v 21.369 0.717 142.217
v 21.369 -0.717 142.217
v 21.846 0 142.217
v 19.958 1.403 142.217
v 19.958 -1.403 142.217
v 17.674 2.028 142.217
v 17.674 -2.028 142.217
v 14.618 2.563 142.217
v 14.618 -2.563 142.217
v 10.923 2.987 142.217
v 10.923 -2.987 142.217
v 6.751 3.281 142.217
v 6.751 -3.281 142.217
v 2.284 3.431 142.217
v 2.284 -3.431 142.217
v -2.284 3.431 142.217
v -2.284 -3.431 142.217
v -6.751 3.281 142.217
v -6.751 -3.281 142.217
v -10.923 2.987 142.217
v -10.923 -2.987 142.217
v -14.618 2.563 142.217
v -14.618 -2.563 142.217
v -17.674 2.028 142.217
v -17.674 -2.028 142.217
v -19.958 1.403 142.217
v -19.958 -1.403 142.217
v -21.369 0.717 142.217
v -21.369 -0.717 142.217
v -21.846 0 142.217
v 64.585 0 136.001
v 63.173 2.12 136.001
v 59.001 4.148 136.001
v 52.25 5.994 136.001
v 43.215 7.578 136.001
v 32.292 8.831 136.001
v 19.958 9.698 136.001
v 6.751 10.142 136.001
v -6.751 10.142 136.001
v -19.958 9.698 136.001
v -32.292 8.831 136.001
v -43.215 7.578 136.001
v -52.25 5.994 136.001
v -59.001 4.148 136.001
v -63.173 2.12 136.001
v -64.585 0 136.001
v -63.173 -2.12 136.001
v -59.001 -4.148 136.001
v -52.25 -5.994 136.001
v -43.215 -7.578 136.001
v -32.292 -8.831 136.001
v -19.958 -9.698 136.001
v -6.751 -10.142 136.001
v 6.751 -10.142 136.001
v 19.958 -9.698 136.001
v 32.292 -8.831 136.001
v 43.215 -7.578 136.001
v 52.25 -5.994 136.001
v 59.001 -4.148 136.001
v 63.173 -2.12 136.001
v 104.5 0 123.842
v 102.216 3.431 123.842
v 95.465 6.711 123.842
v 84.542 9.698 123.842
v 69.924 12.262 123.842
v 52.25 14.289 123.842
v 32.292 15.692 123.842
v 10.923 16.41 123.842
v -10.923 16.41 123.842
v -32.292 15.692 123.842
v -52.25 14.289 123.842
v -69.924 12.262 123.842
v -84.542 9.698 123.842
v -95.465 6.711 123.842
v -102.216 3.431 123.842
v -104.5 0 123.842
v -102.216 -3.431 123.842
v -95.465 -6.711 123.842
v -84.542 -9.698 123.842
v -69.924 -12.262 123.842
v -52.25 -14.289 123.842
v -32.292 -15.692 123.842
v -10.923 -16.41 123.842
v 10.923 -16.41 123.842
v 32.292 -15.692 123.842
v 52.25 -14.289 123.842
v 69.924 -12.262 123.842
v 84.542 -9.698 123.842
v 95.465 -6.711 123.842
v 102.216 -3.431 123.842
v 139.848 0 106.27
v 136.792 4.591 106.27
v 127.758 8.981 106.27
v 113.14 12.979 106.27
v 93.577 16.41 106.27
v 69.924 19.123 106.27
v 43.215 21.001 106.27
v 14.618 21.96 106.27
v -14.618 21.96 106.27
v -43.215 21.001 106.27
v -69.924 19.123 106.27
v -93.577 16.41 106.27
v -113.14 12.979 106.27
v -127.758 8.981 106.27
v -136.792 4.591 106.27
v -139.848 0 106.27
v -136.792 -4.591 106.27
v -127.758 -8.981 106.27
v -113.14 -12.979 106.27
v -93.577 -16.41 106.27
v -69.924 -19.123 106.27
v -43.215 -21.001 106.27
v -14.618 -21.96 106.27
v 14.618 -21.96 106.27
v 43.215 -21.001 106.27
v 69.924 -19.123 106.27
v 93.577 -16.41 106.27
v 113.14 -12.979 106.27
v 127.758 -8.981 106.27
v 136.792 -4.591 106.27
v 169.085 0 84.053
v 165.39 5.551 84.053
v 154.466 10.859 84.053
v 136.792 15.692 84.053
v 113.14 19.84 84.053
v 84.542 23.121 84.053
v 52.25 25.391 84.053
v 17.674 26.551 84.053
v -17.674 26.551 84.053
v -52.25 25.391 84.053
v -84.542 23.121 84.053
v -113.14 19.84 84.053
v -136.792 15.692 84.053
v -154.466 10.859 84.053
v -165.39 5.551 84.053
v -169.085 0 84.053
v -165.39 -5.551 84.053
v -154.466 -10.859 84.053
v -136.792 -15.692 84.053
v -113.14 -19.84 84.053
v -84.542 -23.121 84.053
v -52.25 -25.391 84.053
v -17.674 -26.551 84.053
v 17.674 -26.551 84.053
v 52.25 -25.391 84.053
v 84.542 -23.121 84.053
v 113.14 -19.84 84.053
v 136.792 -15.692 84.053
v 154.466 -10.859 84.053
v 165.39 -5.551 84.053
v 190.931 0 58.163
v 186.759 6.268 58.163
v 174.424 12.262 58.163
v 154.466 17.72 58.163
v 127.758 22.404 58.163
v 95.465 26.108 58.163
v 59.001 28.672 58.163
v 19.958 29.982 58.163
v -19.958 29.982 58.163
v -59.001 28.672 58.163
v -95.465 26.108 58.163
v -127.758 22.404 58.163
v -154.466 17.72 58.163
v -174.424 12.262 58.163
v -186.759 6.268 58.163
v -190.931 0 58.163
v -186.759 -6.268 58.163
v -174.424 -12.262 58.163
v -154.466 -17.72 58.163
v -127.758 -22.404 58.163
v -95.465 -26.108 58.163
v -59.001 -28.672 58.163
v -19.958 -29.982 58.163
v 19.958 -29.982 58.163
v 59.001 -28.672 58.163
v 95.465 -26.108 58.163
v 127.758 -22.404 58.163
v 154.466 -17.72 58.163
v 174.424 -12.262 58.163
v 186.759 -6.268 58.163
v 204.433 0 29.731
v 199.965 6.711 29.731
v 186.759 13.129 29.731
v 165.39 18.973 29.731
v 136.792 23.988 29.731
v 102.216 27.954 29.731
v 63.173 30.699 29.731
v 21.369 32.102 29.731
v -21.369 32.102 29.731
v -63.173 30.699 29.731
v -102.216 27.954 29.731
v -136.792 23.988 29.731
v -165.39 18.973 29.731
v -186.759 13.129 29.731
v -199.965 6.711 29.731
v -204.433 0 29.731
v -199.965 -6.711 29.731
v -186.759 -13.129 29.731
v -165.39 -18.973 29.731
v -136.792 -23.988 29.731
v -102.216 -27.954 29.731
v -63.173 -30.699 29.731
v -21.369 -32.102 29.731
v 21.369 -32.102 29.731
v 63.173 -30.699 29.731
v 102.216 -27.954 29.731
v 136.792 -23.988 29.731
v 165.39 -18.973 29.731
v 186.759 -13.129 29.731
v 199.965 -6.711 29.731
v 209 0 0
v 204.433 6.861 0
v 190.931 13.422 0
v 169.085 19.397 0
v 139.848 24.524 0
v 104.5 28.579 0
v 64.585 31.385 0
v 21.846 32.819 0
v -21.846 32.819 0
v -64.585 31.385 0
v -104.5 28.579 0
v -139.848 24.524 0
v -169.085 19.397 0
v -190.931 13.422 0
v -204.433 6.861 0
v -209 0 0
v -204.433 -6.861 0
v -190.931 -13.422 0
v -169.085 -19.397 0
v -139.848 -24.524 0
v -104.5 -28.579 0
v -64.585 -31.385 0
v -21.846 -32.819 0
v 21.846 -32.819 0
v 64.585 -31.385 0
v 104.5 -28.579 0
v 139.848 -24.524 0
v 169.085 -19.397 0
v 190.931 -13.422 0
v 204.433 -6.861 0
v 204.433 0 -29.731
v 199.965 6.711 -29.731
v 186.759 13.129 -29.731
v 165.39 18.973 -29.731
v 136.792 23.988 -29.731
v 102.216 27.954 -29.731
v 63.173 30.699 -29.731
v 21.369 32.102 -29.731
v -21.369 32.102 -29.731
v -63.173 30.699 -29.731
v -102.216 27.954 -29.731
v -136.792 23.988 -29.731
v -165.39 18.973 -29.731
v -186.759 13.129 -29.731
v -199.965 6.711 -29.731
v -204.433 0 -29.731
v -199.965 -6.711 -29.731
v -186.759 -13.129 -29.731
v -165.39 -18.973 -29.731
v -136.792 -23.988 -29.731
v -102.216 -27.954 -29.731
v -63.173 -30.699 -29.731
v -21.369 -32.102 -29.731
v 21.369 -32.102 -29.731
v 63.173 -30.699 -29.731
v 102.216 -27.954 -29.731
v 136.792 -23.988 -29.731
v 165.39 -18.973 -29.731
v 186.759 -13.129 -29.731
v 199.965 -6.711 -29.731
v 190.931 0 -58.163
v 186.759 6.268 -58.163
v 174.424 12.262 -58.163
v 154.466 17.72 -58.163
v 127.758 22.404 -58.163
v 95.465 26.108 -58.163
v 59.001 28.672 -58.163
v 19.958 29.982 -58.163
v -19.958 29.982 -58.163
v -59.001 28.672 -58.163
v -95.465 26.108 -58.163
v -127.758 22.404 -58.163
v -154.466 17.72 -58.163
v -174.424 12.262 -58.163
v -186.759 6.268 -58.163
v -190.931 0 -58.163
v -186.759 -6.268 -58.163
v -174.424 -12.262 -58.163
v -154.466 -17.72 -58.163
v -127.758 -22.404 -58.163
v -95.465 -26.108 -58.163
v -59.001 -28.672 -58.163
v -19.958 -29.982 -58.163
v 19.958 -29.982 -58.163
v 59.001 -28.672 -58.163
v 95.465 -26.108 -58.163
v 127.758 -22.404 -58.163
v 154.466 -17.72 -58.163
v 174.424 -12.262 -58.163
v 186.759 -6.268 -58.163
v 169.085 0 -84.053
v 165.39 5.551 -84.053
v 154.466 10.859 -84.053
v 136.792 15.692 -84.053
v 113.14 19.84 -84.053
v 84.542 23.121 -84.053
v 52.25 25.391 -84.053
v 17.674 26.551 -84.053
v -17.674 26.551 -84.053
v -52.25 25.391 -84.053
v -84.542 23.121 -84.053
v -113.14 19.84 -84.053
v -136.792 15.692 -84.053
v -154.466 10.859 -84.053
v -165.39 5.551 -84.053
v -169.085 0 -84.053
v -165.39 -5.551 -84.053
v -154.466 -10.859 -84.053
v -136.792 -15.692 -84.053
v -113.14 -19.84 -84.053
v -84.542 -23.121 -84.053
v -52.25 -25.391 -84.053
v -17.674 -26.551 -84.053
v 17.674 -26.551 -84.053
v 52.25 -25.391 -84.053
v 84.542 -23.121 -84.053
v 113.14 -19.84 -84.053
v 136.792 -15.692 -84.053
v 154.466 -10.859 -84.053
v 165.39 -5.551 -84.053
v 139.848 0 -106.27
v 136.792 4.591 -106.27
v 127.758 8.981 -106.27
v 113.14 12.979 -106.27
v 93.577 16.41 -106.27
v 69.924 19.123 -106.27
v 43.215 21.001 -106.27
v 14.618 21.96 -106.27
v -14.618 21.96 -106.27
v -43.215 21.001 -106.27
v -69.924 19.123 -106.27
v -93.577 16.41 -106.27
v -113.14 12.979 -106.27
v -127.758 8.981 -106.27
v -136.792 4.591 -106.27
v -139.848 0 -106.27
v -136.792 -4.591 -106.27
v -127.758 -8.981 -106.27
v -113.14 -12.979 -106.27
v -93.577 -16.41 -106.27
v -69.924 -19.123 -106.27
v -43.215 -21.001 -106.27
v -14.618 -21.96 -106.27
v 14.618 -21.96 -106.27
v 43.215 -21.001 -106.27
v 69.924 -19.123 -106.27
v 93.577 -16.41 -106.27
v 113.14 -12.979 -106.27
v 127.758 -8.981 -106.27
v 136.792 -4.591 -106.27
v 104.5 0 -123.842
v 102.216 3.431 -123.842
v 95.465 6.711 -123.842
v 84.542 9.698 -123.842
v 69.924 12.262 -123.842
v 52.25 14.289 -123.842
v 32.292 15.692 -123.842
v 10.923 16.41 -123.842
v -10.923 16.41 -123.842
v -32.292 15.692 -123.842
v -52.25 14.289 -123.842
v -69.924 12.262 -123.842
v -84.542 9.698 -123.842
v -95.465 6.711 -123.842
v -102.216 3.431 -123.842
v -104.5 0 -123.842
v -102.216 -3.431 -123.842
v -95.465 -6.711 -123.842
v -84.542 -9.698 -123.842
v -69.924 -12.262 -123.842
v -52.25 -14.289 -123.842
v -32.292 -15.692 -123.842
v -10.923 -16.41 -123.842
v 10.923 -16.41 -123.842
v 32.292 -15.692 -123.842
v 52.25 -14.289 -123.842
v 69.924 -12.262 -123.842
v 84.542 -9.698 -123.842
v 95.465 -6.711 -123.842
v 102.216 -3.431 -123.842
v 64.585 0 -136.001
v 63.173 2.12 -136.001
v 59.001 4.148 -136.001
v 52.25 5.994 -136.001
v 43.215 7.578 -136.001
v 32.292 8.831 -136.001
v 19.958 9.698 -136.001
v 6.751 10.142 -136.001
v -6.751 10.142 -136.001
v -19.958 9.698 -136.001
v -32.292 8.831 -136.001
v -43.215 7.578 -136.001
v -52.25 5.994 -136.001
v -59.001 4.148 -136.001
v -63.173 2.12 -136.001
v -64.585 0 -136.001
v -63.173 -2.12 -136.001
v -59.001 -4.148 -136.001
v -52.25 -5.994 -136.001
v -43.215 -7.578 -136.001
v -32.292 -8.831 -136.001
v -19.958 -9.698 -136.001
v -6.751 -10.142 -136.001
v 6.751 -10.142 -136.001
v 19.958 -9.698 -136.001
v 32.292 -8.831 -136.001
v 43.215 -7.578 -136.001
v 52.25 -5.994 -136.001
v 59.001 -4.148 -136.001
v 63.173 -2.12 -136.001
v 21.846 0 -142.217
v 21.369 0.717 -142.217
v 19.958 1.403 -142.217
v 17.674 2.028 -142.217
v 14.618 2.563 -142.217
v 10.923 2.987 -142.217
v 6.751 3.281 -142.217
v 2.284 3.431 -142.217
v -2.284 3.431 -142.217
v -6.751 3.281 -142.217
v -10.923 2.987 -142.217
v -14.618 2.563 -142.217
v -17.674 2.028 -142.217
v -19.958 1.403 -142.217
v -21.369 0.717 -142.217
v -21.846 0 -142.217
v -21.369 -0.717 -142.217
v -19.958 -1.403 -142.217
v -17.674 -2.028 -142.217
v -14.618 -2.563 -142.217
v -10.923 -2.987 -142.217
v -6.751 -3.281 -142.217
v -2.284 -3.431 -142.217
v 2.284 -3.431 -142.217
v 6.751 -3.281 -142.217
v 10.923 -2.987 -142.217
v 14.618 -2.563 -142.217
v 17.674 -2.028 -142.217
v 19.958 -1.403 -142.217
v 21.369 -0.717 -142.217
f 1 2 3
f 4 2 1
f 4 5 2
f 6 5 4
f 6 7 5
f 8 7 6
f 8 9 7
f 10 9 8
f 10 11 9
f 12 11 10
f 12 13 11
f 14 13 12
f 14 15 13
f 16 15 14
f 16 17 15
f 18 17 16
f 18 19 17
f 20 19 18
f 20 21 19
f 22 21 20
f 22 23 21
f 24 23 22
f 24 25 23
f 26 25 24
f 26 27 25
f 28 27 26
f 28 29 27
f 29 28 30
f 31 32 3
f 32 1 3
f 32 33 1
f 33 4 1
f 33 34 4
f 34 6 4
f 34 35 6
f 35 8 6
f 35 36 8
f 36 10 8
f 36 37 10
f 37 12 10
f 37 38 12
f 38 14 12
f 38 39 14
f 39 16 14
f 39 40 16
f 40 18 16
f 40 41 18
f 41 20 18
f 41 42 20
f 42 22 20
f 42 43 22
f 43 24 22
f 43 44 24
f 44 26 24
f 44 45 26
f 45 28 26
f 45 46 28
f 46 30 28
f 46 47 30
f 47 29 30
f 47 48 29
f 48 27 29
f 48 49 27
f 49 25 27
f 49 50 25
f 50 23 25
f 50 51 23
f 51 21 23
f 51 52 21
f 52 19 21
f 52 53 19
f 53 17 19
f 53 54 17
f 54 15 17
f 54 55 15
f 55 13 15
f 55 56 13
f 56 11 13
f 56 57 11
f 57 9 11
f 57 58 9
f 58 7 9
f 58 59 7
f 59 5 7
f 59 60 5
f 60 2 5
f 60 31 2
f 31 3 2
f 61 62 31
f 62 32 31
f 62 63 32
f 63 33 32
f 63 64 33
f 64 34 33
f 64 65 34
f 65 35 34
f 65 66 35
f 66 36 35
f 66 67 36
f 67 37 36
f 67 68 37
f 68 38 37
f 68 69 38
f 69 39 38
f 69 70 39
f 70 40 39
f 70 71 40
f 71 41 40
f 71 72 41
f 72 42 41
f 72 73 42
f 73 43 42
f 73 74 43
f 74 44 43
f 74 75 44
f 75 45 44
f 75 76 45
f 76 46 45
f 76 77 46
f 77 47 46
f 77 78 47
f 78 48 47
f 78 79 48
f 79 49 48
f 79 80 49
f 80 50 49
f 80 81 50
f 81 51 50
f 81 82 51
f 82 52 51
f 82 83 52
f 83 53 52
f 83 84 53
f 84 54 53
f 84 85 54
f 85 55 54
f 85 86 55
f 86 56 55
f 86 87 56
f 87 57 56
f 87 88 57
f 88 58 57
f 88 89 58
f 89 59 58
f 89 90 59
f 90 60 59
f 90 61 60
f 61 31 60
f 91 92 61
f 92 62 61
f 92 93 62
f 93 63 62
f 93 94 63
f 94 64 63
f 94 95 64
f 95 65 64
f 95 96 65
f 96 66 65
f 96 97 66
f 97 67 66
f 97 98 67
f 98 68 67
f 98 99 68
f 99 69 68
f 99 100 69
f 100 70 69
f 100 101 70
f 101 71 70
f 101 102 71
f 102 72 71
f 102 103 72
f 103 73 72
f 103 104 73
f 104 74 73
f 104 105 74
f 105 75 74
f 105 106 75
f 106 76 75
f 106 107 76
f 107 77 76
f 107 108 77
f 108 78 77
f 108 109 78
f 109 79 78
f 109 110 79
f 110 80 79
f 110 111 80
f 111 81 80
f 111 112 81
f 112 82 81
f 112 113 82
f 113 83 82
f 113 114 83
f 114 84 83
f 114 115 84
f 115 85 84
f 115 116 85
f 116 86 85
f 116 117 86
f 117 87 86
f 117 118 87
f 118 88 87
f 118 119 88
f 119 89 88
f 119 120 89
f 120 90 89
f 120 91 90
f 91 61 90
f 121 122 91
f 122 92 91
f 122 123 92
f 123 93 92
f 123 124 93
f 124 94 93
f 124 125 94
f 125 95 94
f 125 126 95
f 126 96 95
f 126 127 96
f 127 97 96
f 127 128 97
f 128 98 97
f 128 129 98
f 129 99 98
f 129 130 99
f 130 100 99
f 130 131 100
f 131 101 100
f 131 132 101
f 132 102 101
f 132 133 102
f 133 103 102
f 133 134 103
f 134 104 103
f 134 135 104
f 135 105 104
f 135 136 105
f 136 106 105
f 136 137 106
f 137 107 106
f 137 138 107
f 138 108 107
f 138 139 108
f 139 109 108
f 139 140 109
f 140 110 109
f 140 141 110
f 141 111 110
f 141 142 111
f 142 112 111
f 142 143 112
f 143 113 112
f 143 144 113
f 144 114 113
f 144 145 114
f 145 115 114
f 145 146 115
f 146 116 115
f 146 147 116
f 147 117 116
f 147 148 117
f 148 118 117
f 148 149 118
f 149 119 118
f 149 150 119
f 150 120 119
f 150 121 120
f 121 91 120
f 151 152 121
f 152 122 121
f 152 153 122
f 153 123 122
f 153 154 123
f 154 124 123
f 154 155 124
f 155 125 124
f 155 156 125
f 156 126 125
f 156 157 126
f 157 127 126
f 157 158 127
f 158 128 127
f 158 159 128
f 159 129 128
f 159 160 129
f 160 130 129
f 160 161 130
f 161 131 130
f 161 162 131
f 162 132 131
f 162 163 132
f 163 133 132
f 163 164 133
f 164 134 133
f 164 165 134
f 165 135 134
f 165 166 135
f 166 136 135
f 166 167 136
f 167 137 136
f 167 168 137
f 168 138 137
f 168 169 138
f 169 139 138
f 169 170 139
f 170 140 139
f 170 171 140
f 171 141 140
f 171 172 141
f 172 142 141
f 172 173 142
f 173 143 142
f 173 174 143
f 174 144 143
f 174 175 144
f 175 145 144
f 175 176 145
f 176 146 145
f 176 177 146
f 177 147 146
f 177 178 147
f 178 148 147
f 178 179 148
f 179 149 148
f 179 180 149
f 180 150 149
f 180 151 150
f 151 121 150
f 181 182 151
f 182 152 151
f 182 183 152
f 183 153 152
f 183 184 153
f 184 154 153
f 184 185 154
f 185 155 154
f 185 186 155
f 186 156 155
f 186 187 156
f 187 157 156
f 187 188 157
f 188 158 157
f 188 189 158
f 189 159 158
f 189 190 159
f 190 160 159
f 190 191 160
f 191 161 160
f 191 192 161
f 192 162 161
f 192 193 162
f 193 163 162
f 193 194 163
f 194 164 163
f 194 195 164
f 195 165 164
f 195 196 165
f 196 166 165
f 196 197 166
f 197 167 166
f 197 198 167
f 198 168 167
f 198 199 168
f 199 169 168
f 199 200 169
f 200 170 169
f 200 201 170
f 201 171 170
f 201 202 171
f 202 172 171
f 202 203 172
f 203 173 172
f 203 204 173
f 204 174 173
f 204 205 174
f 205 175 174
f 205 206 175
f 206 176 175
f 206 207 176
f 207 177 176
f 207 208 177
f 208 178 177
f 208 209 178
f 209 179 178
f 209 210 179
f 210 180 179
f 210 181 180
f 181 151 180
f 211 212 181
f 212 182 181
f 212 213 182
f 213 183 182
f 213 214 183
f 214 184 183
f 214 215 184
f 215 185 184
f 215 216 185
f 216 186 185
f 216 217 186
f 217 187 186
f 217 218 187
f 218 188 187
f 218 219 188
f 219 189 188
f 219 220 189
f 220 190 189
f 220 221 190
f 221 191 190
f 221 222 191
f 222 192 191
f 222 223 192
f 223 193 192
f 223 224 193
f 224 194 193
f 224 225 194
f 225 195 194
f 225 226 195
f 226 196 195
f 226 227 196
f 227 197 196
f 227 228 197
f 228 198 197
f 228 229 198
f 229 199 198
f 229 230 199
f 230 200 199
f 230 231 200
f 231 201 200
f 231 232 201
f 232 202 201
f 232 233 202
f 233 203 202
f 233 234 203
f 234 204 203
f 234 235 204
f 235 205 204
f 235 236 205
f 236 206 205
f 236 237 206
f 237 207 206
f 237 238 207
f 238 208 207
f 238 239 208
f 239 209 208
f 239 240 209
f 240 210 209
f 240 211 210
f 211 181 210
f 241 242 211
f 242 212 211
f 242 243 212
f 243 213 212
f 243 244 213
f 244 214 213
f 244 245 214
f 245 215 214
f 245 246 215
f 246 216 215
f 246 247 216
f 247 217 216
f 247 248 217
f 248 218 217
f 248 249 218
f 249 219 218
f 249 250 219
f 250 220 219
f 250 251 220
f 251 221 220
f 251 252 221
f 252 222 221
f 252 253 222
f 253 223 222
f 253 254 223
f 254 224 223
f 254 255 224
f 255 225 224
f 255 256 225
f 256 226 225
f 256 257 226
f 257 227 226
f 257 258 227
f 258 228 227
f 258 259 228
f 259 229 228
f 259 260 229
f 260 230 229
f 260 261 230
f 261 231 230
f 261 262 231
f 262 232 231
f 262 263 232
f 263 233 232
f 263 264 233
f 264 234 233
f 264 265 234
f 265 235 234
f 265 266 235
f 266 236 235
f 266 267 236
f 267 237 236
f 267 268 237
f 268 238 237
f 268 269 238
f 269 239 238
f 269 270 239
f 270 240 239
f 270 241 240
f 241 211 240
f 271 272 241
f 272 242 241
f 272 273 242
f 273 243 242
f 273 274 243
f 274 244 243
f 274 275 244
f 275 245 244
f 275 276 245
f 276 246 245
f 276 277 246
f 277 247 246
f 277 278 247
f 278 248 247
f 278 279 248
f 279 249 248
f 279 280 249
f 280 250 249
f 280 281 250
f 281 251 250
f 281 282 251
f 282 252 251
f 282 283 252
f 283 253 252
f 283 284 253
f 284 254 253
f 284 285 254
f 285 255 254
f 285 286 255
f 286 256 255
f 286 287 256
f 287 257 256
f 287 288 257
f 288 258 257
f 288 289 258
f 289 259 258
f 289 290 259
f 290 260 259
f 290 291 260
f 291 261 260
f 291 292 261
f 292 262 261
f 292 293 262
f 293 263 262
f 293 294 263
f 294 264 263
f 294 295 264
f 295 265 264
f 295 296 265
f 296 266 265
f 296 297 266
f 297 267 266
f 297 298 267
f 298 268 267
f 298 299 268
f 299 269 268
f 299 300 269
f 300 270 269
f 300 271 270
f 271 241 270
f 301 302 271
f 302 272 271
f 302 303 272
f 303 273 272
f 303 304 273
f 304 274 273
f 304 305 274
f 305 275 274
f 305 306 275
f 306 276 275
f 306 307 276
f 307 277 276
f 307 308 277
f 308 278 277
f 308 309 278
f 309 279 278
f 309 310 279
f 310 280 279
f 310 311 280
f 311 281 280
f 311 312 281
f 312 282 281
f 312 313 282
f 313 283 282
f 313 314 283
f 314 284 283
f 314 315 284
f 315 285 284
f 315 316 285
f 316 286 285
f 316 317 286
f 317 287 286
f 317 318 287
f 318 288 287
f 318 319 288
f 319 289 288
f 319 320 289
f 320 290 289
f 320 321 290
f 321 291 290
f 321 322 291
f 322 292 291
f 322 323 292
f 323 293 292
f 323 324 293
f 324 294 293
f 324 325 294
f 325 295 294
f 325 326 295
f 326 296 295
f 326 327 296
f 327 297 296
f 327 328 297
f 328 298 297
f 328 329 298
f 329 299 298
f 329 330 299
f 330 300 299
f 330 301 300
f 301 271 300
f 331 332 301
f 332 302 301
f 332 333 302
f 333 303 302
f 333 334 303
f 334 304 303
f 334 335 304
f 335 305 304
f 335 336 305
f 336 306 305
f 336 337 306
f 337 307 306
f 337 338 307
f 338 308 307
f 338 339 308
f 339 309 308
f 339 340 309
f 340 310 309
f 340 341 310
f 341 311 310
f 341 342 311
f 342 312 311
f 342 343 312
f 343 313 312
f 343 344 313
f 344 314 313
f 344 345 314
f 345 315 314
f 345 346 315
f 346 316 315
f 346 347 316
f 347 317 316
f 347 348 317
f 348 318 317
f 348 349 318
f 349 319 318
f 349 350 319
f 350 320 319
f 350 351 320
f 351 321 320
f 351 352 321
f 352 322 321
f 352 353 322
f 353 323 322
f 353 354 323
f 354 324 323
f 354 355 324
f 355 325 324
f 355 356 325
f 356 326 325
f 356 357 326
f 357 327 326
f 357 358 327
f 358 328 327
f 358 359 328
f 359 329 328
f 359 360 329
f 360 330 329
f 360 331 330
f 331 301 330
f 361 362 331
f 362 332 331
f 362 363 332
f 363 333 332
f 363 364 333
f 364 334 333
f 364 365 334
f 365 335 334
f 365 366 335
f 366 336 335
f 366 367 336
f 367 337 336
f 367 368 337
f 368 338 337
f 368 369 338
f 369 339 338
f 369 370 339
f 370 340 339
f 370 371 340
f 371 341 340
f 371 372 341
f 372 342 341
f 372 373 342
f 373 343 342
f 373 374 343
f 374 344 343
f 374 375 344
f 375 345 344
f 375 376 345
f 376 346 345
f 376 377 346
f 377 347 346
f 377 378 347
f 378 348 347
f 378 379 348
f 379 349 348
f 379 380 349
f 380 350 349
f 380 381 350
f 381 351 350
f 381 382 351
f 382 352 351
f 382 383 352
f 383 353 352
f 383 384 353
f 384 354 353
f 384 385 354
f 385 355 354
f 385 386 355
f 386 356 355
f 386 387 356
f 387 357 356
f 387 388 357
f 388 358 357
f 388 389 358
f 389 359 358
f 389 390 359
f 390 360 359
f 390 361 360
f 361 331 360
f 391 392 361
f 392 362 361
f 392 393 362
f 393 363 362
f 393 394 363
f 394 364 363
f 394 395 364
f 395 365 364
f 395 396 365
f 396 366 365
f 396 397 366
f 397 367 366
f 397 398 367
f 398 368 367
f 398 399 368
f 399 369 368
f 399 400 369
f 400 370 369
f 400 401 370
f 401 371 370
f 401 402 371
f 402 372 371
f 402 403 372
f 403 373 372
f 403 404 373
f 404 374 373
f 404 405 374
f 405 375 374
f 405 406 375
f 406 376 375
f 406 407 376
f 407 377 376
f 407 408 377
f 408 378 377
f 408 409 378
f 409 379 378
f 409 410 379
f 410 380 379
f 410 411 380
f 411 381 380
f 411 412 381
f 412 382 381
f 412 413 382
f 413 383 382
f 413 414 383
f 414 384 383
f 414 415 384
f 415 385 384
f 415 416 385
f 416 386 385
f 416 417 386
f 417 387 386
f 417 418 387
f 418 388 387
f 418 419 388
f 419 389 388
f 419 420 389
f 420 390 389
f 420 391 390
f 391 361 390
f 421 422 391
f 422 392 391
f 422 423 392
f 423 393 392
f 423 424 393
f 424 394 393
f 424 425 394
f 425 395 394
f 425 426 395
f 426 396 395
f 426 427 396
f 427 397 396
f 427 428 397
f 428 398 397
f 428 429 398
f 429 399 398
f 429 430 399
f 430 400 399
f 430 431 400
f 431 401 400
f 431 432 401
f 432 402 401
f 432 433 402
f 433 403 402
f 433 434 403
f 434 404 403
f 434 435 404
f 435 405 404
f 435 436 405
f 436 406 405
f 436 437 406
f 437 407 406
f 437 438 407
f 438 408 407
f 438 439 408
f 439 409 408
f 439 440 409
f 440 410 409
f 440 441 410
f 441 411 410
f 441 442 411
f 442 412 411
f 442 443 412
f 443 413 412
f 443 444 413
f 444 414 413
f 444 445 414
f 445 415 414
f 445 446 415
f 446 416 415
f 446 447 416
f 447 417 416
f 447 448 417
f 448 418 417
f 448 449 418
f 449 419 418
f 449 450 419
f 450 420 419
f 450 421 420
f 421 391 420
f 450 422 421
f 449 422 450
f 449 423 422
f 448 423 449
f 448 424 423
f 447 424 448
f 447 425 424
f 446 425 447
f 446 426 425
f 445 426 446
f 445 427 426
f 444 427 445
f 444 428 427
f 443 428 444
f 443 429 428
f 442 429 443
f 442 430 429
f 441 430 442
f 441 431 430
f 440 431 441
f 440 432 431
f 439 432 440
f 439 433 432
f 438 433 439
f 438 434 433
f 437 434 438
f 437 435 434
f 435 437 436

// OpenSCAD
// Generated by SolidPython 1.0.1 on 2020-07-29 00:46:53


scale(v = [19, 3, 13]) {
	sphere(r = 11);
}
/***********************************************
*********      SolidPython code:      **********
************************************************
 
# import packages: SolidPython
from solid import *
from solid.utils import *
from itertools import chain, combinations, permutations


class Resize:

    def __init__(self, scad_file):
        self.scad_file = scad_file
        #self.scad_file = import_scad(scad_file)
        # cone/cylinder param:
        self.r1 = 0
        self.r2 = 0
        self.h = 0
        # rectangular prism param:
        self.w = 0
        self.l = 0
        # ellipse param:
        self.r = 0

    # import OpenScad code (file name corresponds to shape)


    # classify shape + parameters
    def assign(self, param1, param2, param3):
        if self.scad_file == 'cone.scad':
            self.r1 = param1
            self.r2 = param2
            self.h = param3
        elif self.scad_file == 'cylinder.scad':
            self.r1 = param1
            self.r2 = param2
            self.h = param3
        elif self.scad_file == 'rectangularPrism.scad':
            self.h = param1
            self.l = param2
            self.w = param3
        else:
            self.r = param1
            self.h = param2

    # resize parameters
    def iterate(self):
        x = range(3, 20, 2)
        i = 1
        if self.scad_file == 'cone.scad':
            tempList = list(permutations(x, 2))
            for temp in tempList:
                param1 = temp[0]
                param2 = temp[1]
                filepath = 'produced_scad_files/' + 'cone' + str(param1) + '_' + str(param2) + '_' + '.scad'
                scad_render_to_file(cylinder(h=param1, r1=param2, r2=0), filepath)

        elif self.scad_file == 'cylinder.scad':
            tempList = list(permutations(x, 3))
            for temp in tempList:
                param1 = temp[0]
                param2 = temp[1]
                filepath = 'produced_scad_files/' + 'cylinder' + str(param1) + '_' + str(param2) + '_' + '.scad'
                scad_render_to_file(cylinder(h=param1, r1=param2, r2=param2), filepath)

        elif self.scad_file == 'rectangularPrism.scad':
            tempList = list(permutations(x, 3))
            for temp in tempList:
                param1 = temp[0]
                param2 = temp[1]
                param3 = temp[2]
                filepath = 'produced_scad_files/' + 'rectangularPrism' + str(param1) + '_' + str(param2) + '_' + str(
                    param3) + '.scad'
                scad_render_to_file(cube(size=(param1, param2, param3)), filepath)

        elif self.scad_file == 'ellipse.scad':
            tempList = list(permutations(x, 4))
            for temp in tempList:
                param1 = temp[0]
                param2 = temp[1]
                param3 = temp[2]
                param4 = temp[3]
                filepath = 'produced_scad_files/' + 'ellipse' + str(param1) + '_' + str(param2) + '_' + str(param3) + '_' + str(param4) + '.scad'
                scad_render_to_file(scale([param1, param2, param3])(sphere(r=param4)), filepath)

    def render_to_scadfile(self):
        scad_render_to_file(scad, 'example.scad') 
 
************************************************/
